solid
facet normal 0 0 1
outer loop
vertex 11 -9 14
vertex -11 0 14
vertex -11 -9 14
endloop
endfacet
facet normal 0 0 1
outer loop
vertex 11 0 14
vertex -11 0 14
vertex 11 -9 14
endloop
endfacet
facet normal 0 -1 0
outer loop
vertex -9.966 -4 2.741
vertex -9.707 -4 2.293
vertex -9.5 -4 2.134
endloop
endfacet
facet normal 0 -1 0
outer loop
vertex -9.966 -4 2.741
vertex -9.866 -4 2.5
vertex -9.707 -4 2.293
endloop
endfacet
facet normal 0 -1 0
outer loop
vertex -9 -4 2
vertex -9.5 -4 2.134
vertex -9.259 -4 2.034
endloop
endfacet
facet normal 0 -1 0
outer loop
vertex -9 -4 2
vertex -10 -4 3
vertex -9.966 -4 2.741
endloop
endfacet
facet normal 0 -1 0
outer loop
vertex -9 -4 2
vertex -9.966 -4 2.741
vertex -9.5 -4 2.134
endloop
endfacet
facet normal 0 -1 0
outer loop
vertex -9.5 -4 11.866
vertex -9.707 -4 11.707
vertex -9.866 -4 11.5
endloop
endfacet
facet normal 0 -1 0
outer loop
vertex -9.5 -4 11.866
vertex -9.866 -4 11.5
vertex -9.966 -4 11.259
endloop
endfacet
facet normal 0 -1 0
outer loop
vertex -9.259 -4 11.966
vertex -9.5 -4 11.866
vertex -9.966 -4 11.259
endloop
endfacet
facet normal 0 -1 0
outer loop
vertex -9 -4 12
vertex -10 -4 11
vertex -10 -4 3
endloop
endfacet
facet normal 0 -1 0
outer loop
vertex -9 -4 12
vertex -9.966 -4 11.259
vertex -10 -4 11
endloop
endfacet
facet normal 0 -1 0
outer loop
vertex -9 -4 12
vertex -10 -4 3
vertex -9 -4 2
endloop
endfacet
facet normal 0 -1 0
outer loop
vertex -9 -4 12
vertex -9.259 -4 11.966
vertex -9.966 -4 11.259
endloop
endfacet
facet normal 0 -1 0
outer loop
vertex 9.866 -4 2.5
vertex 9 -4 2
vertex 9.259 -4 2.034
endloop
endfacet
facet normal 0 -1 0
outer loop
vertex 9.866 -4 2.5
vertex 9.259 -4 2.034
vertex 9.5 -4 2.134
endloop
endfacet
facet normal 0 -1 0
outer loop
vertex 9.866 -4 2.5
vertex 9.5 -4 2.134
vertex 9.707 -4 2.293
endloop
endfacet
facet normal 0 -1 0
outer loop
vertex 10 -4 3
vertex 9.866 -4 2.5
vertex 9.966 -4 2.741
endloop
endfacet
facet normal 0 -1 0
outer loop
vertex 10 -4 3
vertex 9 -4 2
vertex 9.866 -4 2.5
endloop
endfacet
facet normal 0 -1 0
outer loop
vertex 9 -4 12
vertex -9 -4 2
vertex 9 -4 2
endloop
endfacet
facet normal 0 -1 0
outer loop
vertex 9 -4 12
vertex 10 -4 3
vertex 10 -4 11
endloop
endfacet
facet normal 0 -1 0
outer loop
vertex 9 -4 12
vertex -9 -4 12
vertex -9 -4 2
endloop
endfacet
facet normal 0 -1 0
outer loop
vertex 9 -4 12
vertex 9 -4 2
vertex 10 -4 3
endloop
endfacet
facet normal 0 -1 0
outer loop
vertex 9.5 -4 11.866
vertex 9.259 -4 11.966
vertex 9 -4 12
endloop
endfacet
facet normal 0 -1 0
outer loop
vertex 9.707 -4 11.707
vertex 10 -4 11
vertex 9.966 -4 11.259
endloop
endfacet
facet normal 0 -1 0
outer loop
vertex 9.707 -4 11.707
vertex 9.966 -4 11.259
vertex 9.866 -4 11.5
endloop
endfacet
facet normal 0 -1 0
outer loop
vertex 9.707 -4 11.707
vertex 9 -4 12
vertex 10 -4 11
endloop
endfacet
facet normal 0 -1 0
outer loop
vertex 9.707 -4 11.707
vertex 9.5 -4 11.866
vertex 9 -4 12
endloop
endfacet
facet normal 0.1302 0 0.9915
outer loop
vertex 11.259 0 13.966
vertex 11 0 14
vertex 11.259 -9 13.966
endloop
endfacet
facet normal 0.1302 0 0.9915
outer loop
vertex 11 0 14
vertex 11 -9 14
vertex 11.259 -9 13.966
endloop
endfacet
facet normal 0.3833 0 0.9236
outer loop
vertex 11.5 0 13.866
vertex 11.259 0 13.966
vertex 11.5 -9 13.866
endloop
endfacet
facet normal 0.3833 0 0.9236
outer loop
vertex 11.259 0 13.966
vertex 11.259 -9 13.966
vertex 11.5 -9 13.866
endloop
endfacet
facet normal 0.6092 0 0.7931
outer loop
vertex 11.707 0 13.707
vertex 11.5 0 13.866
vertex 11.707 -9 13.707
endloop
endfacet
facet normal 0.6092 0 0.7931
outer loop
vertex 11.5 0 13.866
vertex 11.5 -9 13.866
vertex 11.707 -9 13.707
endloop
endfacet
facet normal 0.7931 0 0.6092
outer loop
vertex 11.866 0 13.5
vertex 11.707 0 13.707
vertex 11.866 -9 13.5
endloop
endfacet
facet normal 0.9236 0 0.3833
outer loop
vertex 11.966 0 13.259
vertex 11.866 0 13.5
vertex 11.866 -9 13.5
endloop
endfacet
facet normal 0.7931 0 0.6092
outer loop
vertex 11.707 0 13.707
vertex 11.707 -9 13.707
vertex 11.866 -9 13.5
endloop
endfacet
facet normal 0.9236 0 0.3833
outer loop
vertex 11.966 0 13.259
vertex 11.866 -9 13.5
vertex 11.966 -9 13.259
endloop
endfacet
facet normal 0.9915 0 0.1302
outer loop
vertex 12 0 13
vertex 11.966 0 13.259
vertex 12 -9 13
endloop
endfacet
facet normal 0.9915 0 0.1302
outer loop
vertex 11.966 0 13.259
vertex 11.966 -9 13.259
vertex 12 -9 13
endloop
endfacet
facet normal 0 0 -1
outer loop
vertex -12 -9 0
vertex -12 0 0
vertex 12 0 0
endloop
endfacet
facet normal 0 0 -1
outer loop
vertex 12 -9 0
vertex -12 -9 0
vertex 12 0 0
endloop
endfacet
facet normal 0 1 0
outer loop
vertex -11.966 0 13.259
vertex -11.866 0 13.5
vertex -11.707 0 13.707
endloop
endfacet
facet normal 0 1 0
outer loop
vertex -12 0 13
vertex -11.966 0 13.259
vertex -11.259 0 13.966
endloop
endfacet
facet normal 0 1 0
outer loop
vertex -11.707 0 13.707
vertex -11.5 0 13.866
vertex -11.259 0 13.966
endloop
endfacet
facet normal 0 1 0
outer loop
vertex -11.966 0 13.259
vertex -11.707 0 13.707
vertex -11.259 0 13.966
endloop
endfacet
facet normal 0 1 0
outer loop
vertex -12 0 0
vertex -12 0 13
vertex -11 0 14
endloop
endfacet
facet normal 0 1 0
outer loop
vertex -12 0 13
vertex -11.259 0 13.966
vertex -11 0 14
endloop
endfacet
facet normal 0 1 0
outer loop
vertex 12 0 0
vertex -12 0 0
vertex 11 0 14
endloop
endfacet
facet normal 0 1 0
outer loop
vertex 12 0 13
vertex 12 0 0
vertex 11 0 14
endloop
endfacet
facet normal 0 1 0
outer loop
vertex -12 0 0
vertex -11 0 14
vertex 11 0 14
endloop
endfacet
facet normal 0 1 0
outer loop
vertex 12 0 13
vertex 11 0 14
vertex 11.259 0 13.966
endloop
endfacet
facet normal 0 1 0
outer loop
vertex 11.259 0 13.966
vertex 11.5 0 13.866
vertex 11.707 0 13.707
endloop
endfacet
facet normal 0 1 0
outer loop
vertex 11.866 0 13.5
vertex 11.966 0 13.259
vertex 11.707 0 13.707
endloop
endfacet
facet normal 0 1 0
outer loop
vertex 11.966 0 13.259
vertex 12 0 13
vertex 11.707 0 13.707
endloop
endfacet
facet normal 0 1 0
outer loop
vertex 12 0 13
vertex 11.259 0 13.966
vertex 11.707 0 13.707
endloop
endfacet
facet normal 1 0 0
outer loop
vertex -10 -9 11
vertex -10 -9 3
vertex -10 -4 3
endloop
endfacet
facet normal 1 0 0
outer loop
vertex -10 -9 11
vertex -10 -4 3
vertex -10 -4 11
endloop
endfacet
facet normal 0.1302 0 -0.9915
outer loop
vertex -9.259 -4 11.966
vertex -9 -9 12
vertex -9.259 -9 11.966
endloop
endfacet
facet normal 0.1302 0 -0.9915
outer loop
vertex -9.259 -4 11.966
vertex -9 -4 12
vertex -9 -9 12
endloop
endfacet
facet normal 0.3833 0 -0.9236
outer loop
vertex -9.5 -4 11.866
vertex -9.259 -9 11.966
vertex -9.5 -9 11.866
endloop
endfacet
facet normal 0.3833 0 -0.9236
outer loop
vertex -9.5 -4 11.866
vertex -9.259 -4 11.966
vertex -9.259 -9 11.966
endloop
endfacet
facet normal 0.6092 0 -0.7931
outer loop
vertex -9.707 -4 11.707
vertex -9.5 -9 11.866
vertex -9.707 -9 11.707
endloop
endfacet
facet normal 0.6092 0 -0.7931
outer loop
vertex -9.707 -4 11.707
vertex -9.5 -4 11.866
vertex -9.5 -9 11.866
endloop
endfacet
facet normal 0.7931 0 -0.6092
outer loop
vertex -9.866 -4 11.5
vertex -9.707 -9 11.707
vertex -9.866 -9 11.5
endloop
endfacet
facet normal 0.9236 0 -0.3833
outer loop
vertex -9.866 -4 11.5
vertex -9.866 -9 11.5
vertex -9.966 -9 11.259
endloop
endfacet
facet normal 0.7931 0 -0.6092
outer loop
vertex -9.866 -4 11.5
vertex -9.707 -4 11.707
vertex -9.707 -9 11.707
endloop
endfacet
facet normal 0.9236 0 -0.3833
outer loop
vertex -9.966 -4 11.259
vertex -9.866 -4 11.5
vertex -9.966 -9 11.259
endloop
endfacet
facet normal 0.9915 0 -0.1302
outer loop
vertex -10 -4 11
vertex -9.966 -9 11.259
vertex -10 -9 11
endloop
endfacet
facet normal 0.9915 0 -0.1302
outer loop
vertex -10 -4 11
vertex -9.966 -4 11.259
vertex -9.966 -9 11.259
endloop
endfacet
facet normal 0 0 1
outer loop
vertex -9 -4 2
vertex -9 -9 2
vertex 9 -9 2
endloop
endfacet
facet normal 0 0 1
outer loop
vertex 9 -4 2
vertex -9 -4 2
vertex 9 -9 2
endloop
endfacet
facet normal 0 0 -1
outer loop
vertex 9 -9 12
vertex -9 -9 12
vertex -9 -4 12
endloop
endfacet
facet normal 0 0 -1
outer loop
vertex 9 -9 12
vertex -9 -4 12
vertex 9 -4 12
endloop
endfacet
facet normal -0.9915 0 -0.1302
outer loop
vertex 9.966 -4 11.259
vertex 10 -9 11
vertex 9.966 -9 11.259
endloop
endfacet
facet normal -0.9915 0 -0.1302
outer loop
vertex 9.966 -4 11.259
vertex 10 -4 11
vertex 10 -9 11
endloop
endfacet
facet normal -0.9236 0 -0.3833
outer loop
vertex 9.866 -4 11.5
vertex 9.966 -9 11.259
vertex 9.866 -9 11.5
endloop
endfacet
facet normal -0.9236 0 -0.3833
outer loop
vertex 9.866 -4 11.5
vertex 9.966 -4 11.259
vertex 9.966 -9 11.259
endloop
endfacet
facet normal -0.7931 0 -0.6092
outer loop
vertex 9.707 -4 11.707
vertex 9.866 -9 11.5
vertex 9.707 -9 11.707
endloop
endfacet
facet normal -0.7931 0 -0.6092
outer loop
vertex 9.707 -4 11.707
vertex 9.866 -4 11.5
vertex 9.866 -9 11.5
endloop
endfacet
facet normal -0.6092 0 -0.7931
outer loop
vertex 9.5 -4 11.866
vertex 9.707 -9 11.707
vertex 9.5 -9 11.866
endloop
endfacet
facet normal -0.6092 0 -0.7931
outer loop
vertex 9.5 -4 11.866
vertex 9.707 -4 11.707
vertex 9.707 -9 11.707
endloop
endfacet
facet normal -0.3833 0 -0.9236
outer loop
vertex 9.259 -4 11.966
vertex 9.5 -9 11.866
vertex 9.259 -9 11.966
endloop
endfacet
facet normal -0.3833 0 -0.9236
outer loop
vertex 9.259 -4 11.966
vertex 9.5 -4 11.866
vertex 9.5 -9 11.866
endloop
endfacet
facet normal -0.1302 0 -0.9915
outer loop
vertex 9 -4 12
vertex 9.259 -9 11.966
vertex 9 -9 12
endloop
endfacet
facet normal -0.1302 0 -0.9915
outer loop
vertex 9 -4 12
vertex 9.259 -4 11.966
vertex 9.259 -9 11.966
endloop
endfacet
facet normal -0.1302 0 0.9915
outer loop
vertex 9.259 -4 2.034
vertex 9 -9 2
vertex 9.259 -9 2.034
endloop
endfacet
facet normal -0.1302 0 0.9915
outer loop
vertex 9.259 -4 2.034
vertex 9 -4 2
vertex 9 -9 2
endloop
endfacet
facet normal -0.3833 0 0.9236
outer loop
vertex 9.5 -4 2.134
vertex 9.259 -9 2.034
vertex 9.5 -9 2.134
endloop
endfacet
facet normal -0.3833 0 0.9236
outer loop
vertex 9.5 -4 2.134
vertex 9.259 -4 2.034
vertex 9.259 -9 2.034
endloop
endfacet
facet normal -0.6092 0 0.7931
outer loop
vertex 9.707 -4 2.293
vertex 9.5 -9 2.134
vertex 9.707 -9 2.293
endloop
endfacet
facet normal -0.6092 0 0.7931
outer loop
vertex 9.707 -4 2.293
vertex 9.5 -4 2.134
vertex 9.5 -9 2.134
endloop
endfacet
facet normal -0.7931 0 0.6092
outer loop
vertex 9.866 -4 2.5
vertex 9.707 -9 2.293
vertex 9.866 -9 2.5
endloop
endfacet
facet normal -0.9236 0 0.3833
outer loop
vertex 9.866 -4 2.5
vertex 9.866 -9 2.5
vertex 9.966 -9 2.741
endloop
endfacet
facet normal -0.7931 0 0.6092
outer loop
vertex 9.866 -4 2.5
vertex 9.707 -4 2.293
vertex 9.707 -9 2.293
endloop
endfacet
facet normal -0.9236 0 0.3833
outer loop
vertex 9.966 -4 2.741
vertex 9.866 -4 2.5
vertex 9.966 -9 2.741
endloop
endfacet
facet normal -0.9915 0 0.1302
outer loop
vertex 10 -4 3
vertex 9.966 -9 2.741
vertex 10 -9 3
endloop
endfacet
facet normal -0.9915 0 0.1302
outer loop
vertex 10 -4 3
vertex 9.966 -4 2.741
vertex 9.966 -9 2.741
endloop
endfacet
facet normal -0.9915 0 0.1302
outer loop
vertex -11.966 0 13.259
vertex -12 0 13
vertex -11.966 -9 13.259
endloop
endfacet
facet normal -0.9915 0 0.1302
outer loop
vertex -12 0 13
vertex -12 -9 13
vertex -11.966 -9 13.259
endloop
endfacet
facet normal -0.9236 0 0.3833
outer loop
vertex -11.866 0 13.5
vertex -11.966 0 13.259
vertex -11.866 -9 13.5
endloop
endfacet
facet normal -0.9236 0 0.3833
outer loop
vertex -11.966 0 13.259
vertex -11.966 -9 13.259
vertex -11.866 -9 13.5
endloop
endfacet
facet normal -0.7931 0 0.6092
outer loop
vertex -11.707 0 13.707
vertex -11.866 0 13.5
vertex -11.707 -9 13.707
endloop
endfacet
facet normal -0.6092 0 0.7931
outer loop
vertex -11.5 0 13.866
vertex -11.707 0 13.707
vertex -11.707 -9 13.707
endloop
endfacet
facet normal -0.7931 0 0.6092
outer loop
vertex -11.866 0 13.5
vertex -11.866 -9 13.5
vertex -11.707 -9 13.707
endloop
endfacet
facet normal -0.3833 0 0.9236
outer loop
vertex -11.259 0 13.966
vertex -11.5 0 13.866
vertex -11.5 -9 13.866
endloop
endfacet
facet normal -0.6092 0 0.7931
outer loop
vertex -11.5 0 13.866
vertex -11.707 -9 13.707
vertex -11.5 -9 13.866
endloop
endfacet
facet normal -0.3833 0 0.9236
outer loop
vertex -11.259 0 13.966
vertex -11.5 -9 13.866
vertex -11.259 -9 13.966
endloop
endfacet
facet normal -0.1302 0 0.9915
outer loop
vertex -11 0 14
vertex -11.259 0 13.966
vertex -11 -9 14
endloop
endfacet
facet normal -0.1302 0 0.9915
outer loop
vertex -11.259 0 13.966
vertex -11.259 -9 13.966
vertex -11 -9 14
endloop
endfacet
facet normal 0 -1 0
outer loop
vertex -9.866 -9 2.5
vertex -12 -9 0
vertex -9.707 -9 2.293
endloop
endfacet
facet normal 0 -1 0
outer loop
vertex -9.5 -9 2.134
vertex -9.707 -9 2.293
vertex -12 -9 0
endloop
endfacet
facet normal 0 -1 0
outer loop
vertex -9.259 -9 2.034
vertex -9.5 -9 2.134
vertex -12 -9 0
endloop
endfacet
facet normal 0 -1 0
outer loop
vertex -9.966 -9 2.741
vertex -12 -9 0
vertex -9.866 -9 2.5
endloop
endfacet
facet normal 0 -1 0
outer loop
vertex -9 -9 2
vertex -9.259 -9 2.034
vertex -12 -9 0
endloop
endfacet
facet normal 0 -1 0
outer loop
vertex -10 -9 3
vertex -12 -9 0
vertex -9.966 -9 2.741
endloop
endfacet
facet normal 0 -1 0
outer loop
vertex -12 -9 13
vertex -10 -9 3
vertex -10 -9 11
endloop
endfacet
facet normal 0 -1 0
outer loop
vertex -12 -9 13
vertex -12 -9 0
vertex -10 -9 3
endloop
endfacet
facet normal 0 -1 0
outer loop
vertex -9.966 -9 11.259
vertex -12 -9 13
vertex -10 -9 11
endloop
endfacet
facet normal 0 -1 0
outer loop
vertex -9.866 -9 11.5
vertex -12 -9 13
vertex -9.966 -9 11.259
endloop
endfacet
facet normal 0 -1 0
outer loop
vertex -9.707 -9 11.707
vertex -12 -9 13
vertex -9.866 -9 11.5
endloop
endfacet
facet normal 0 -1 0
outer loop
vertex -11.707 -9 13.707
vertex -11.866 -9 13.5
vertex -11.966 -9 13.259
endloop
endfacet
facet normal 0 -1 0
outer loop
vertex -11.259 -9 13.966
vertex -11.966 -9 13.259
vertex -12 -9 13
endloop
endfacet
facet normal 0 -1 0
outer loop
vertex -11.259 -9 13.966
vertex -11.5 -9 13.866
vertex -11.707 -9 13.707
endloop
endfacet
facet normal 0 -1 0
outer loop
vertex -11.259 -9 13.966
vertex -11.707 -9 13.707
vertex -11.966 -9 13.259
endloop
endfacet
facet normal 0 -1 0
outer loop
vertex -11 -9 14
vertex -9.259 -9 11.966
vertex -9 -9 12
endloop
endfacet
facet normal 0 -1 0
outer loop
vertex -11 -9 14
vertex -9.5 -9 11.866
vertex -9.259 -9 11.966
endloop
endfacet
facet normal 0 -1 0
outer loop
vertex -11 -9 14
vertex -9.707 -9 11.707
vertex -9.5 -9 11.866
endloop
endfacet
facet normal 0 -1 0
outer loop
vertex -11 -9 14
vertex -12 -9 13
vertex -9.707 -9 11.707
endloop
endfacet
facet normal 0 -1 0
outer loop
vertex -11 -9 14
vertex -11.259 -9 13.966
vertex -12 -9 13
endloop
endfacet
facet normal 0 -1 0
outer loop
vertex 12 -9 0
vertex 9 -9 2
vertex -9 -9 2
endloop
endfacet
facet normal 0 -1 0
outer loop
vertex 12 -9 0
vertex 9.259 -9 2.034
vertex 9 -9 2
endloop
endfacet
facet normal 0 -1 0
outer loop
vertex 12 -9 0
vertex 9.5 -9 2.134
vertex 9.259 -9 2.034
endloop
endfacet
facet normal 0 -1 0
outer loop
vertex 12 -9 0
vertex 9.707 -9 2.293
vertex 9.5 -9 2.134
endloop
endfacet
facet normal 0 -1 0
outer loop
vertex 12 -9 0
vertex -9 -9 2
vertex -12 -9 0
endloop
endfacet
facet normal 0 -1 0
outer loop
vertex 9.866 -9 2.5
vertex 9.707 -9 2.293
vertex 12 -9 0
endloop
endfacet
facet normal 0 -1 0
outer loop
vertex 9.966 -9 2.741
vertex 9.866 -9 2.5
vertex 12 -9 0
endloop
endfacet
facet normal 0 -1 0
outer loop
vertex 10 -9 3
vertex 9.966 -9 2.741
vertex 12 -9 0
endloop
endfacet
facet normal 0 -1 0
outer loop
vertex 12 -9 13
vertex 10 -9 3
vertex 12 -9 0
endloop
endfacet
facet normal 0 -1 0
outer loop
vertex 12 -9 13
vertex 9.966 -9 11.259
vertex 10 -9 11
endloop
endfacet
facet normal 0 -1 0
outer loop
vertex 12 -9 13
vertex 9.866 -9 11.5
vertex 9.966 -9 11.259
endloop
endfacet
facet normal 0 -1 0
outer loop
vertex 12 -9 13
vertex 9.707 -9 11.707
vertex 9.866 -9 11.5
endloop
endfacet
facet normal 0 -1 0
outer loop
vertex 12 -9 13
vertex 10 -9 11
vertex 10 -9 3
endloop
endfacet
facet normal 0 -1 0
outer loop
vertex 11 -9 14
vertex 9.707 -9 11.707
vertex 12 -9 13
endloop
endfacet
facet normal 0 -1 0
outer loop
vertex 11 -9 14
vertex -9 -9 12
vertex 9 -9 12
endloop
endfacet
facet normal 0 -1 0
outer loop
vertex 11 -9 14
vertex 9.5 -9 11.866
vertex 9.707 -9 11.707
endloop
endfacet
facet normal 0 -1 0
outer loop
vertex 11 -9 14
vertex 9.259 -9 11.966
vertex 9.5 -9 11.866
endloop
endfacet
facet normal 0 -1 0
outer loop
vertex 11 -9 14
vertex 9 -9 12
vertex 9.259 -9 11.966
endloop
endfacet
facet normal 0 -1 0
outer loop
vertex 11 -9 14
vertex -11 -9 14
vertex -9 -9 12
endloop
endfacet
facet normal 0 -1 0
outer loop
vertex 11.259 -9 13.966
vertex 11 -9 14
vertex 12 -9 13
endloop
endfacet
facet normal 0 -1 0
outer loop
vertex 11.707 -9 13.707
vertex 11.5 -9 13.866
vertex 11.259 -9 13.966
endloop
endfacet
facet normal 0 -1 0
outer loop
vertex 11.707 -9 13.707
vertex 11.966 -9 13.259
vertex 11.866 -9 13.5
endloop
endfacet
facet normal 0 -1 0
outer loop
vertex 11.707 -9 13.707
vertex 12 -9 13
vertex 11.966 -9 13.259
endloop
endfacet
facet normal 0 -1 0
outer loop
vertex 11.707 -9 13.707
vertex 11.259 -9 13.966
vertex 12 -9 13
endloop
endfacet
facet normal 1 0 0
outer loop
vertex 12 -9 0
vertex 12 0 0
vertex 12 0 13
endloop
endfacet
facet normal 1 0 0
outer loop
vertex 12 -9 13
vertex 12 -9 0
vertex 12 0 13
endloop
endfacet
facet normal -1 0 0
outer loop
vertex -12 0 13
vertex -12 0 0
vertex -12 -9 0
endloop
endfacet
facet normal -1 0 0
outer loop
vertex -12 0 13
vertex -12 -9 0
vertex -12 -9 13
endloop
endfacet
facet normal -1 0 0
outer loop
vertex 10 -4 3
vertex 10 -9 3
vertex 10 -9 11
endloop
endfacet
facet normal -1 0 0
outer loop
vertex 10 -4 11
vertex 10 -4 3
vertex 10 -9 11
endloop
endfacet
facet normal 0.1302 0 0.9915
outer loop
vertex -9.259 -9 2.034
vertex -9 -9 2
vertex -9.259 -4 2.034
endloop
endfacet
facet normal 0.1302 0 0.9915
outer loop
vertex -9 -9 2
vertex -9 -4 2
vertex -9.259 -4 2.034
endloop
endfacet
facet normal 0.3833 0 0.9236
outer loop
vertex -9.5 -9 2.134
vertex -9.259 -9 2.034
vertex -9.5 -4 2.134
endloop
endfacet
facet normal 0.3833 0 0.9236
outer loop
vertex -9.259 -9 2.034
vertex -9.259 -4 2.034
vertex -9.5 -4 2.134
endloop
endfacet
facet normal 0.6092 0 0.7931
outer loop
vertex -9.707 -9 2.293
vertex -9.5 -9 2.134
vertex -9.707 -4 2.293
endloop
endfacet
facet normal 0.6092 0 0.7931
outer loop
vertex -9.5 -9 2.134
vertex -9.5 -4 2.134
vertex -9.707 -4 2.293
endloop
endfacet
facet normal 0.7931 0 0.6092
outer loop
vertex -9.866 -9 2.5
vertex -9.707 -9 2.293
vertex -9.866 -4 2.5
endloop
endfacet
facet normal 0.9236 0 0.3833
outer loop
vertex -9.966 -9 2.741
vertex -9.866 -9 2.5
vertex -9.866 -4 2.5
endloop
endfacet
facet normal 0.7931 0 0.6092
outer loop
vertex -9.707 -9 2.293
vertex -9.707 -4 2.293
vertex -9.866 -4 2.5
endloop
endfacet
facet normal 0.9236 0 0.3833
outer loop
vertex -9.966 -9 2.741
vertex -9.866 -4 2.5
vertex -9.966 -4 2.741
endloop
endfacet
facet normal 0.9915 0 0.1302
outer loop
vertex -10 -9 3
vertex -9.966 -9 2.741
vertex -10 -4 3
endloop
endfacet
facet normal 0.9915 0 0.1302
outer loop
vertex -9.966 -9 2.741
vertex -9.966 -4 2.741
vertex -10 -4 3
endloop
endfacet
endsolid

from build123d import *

# Parameters (mm, degrees)
F4_W     = 24
F4_H     = 14
F5_DEPTH = 9
F6_W     = 20
F6_H     = 10
F7_DEPTH = 5
F8_R     = 1


with BuildPart() as f5:
    # F4 (on Front) → F5 (new body)
    with BuildSketch(Plane.XZ):
        with Locations((0, 7)):
            Rectangle(F4_W, F4_H)
    extrude(amount=F5_DEPTH)

    # F6 (on face) → F7 (cut)
    with BuildSketch(Plane.XZ.offset(9)):
        with Locations((0, 7)):
            Rectangle(F6_W, F6_H)
    extrude(amount=-F7_DEPTH, mode=Mode.SUBTRACT)

    # F8
    f8_edges = [f5.edges().sort_by_distance(p)[0] for p in [
        (-12, -4.5, 14),
        (12, -4.5, 14),
        (-10, -6.5, 12),
        (10, -6.5, 12),
        (10, -6.5, 2),
        (-10, -6.5, 2),
    ]]
    fillet(f8_edges, radius=F8_R)


solid = f5.part
